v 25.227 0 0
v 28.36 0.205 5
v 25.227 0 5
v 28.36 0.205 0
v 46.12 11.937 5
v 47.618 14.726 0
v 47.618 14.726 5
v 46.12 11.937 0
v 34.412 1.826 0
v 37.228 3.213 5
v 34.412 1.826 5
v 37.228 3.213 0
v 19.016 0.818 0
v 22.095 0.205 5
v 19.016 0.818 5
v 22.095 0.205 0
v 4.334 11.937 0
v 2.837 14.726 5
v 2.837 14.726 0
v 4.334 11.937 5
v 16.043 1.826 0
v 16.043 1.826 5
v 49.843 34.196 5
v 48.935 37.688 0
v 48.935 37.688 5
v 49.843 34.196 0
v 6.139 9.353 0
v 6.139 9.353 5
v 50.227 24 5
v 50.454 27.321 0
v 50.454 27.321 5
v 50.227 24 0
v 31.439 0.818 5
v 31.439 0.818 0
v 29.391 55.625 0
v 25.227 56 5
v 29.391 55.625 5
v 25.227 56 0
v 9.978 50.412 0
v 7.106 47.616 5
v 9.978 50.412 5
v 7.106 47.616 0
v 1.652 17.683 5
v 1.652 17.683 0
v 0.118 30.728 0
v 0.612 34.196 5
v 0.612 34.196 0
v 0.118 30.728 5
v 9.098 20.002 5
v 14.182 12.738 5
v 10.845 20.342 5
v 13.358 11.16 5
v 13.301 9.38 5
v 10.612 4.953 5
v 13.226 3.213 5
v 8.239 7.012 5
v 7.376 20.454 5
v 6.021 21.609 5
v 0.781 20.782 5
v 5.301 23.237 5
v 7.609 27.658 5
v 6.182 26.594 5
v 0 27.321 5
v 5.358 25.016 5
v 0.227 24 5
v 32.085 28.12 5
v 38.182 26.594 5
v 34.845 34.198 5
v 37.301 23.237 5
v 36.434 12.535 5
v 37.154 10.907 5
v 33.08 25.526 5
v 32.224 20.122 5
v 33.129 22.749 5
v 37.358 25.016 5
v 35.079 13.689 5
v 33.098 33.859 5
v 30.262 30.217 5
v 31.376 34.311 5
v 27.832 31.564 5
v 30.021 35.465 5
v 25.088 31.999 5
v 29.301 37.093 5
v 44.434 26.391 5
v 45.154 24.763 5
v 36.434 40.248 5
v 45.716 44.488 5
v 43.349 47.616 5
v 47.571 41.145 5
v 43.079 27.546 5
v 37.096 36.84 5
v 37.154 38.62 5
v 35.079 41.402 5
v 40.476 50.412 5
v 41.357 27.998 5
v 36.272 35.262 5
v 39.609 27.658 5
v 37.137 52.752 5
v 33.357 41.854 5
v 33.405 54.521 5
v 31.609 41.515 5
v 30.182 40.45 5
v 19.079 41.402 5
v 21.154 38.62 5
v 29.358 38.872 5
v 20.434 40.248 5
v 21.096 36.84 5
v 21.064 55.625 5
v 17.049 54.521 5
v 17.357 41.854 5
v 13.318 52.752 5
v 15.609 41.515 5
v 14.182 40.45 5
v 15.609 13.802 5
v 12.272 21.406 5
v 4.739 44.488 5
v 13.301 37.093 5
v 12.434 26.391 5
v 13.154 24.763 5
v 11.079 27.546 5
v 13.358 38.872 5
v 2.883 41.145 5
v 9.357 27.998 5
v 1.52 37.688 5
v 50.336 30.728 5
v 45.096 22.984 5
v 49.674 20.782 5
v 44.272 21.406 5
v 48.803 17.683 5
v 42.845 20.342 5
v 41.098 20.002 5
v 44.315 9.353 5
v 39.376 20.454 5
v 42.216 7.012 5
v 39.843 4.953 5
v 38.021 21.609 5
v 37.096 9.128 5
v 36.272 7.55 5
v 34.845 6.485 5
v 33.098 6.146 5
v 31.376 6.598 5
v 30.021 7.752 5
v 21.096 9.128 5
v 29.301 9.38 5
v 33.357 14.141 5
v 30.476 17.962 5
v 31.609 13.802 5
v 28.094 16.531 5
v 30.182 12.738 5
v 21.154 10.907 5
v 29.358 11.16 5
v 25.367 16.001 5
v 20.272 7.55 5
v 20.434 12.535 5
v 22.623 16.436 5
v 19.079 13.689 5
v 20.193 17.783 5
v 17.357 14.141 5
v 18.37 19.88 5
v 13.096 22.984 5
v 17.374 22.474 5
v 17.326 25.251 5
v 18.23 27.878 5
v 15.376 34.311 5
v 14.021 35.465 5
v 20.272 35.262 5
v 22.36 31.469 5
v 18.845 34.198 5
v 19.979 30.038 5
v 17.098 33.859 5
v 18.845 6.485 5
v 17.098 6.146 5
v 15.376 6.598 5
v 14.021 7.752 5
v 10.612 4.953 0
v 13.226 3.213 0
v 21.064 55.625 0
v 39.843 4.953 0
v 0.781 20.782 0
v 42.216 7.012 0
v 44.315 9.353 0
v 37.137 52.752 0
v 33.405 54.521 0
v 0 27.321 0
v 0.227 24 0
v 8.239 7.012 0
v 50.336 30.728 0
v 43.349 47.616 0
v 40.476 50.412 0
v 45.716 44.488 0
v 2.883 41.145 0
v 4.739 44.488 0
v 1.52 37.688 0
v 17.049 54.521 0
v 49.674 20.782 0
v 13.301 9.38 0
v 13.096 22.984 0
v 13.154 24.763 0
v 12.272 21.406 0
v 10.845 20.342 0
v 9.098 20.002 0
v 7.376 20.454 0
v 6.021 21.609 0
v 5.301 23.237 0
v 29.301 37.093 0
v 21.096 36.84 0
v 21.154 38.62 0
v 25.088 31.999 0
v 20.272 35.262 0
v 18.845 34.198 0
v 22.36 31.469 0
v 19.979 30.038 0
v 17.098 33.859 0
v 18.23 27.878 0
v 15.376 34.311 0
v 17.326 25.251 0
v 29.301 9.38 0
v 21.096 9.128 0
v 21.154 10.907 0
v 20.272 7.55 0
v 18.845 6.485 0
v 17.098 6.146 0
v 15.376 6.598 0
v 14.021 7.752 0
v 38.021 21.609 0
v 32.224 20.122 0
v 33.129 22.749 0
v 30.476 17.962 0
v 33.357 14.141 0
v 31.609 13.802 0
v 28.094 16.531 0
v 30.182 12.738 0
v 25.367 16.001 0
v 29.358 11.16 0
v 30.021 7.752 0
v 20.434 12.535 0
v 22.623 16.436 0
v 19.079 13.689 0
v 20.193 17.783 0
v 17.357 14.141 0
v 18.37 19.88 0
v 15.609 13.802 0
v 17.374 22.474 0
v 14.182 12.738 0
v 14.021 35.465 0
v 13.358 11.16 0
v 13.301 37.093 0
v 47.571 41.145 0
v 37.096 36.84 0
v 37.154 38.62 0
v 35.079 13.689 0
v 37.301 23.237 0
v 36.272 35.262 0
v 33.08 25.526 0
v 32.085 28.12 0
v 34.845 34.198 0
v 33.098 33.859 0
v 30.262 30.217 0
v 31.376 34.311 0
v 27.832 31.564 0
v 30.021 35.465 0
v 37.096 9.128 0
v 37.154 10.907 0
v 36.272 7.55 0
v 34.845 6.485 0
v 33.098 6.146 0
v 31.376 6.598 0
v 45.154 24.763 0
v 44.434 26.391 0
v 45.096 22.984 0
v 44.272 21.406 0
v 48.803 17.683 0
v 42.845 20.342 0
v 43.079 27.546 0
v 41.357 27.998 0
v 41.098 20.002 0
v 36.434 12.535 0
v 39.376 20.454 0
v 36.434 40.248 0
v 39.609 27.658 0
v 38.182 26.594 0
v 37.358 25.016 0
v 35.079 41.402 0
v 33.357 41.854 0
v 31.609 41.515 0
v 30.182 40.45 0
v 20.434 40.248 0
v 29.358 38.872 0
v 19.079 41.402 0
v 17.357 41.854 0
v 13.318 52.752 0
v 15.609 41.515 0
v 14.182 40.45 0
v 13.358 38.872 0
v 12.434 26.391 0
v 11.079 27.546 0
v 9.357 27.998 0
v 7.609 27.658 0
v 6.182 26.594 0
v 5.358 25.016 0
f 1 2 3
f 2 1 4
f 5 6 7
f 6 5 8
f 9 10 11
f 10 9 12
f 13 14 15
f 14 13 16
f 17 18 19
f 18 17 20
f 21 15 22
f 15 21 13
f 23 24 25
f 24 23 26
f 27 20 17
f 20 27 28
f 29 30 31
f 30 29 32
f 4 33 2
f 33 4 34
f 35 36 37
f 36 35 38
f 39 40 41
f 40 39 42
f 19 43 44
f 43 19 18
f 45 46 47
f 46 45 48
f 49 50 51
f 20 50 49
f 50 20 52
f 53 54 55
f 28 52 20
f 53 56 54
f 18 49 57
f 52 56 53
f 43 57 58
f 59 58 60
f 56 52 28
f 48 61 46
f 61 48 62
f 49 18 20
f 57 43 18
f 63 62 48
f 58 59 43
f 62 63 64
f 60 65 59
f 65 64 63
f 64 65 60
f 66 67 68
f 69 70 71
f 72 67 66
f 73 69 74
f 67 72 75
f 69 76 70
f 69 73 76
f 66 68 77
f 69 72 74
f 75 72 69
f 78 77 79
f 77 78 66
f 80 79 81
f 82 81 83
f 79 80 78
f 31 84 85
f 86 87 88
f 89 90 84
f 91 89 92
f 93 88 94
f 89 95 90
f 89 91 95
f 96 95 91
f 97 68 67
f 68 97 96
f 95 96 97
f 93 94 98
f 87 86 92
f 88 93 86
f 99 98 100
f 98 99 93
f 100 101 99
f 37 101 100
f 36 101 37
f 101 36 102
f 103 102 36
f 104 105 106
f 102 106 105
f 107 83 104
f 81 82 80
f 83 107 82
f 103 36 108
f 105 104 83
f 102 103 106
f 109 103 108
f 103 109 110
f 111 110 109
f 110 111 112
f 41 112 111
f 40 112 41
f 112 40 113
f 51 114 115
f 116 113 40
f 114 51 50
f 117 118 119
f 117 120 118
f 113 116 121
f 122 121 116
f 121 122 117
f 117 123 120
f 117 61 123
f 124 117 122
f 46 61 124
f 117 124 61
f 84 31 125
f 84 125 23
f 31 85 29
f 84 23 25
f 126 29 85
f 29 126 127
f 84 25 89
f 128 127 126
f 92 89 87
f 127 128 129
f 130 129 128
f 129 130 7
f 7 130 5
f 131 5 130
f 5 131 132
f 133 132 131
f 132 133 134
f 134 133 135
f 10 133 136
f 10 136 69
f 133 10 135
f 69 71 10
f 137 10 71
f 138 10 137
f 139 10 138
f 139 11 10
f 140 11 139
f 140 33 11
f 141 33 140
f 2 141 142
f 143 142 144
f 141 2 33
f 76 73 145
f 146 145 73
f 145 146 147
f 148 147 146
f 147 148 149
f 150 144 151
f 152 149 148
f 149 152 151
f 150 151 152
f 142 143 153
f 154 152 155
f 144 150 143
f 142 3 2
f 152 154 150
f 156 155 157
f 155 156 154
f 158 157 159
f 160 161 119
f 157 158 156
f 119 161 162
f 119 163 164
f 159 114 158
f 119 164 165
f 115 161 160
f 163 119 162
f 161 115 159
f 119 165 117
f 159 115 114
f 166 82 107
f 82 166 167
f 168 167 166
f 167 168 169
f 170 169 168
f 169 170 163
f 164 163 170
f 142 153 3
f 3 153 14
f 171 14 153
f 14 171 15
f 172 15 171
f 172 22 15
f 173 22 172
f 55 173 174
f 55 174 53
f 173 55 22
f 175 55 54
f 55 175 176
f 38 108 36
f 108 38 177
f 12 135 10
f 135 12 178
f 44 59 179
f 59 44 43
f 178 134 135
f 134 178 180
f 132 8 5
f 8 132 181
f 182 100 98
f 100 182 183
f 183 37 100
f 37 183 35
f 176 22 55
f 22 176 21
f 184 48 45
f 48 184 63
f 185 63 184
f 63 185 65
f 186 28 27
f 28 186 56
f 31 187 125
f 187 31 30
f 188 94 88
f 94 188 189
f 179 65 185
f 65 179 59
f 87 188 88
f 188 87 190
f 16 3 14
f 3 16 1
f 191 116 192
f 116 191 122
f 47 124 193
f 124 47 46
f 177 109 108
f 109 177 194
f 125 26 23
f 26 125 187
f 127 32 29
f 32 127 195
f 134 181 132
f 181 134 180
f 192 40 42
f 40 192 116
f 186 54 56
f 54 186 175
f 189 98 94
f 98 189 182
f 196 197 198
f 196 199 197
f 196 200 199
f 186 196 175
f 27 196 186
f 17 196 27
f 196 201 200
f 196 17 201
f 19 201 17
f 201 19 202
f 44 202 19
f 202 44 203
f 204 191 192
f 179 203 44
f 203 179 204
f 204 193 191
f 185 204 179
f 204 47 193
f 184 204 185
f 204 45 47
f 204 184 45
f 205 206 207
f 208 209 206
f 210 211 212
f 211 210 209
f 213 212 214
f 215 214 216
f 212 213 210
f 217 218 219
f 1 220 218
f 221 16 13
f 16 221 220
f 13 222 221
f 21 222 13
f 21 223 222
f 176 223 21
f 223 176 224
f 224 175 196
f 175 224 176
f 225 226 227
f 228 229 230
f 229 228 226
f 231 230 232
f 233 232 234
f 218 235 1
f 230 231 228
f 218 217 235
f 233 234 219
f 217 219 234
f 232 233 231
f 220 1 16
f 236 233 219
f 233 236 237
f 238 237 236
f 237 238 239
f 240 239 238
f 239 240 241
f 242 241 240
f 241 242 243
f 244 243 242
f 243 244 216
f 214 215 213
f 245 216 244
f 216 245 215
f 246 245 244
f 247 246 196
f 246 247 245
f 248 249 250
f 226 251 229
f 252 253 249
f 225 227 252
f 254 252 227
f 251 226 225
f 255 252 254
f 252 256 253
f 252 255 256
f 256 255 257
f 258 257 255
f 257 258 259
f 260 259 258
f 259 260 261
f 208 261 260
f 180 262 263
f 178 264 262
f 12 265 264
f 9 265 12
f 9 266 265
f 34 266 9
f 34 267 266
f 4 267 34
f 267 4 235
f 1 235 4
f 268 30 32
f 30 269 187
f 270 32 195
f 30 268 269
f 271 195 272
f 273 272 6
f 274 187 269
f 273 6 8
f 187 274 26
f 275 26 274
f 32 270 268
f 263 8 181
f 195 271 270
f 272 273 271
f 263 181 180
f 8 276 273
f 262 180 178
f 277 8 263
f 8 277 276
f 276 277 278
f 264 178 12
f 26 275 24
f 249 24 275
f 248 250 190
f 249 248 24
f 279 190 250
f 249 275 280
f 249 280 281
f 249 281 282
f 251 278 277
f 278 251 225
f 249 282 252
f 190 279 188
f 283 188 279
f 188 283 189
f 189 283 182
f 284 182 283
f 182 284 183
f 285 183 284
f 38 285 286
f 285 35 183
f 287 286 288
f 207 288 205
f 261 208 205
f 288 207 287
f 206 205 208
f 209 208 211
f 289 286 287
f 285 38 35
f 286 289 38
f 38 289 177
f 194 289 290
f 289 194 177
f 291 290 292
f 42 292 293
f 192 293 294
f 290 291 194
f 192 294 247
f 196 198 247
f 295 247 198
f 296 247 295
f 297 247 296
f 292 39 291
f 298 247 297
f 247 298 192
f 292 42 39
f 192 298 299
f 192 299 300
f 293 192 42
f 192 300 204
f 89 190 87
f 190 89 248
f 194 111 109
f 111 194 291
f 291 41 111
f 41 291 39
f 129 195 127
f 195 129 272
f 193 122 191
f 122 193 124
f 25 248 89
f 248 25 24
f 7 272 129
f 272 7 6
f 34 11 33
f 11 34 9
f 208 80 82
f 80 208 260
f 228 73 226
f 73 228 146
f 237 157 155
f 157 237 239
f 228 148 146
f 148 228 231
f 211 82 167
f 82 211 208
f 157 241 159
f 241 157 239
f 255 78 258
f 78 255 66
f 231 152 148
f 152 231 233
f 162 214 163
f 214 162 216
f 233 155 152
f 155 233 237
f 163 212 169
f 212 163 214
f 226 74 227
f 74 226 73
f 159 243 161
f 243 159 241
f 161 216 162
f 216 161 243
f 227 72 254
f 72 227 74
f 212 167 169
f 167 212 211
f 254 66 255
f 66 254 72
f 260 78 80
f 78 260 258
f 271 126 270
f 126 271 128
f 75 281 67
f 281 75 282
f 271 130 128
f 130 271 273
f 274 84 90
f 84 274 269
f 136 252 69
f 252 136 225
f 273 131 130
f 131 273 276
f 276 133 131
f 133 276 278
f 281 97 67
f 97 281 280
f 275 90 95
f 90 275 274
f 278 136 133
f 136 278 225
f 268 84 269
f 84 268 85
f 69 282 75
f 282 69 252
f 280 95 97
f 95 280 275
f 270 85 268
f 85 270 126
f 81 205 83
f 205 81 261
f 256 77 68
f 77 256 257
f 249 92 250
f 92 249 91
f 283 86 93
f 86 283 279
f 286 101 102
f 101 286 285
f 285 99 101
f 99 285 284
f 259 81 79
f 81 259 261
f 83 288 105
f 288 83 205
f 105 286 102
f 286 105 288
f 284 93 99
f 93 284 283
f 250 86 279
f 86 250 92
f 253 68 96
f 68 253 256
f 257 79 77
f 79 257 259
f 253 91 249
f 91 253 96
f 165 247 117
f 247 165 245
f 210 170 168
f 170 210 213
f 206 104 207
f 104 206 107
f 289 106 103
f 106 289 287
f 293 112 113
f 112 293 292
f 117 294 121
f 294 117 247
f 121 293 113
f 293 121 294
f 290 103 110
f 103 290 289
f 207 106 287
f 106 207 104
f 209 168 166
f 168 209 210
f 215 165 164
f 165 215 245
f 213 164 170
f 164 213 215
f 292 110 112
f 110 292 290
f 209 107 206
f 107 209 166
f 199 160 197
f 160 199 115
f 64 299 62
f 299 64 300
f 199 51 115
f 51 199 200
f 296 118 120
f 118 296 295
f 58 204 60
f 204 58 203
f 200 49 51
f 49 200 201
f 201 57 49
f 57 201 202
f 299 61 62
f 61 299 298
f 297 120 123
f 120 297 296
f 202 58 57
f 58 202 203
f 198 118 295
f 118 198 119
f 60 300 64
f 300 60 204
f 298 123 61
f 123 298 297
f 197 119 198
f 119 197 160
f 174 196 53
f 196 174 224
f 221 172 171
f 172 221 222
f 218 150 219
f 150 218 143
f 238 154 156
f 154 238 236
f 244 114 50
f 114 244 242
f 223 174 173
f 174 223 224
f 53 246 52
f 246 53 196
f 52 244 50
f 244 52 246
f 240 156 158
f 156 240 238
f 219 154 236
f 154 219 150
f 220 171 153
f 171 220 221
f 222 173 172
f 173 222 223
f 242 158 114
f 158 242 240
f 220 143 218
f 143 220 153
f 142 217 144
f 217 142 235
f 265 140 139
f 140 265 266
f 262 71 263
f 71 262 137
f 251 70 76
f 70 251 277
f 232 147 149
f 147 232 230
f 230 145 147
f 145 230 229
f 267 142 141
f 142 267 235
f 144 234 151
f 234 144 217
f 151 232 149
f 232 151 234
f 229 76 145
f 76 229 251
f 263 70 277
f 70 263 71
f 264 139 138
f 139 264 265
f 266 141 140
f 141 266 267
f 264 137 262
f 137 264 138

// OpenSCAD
$fn = 32;

// ----------------------------------------------------------------------
// Cam plate: single_lobe cam, base R24
// ----------------------------------------------------------------------

// --- parameters (mm) ---
base_r = 24;              // base circle radius
lobe_h = 8;               // cam lobe rise
bore_r = 8;               // shaft bore radius
plate_t = 5;              // plate thickness, Z (extrusion height)
ring_r = 16;              // lightening ring radius
bolt_r = 4;               // lightening hole radius

profile = [[50.227, 24], [50.454, 27.321], [50.336, 30.728], [49.843, 34.196], [48.935, 37.688], [47.571, 41.145], [45.716, 44.488], [43.349, 47.616], [40.476, 50.412], [37.137, 52.752], [33.405, 54.521], [29.391, 55.625], [25.227, 56], [21.064, 55.625], [17.049, 54.521], [13.318, 52.752], [9.978, 50.412], [7.106, 47.616], [4.739, 44.488], [2.883, 41.145], [1.52, 37.688], [0.612, 34.196], [0.118, 30.728], [0, 27.321], [0.227, 24], [0.781, 20.782], [1.652, 17.683], [2.837, 14.726], [4.334, 11.937], [6.139, 9.353], [8.239, 7.012], [10.612, 4.953], [13.226, 3.213], [16.043, 1.826], [19.016, 0.818], [22.095, 0.205], [25.227, 0], [28.36, 0.205], [31.439, 0.818], [34.412, 1.826], [37.228, 3.213], [39.843, 4.953], [42.216, 7.012], [44.315, 9.353], [46.12, 11.937], [47.618, 14.726], [48.803, 17.683], [49.674, 20.782]];  // primary outline, 48 points, counter clockwise
void_1 = [[33.08, 25.526], [32.085, 28.12], [30.262, 30.217], [27.832, 31.564], [25.088, 31.999], [22.36, 31.469], [19.979, 30.038], [18.23, 27.878], [17.326, 25.251], [17.374, 22.474], [18.37, 19.88], [20.193, 17.783], [22.623, 16.436], [25.367, 16.001], [28.094, 16.531], [30.476, 17.962], [32.224, 20.122], [33.129, 22.749]];  // shaft bore, 18 points
void_2 = [[45.154, 24.763], [44.434, 26.391], [43.079, 27.546], [41.357, 27.998], [39.609, 27.658], [38.182, 26.594], [37.358, 25.016], [37.301, 23.237], [38.021, 21.609], [39.376, 20.454], [41.098, 20.002], [42.845, 20.342], [44.272, 21.406], [45.096, 22.984]];  // lightening hole 1, 14 points
void_3 = [[37.154, 38.62], [36.434, 40.248], [35.079, 41.402], [33.357, 41.854], [31.609, 41.515], [30.182, 40.45], [29.358, 38.872], [29.301, 37.093], [30.021, 35.465], [31.376, 34.311], [33.098, 33.859], [34.845, 34.198], [36.272, 35.262], [37.096, 36.84]];  // lightening hole 2, 14 points
void_4 = [[21.154, 38.62], [20.434, 40.248], [19.079, 41.402], [17.357, 41.854], [15.609, 41.515], [14.182, 40.45], [13.358, 38.872], [13.301, 37.093], [14.021, 35.465], [15.376, 34.311], [17.098, 33.859], [18.845, 34.198], [20.272, 35.262], [21.096, 36.84]];  // lightening hole 3, 14 points
void_5 = [[13.154, 24.763], [12.434, 26.391], [11.079, 27.546], [9.357, 27.998], [7.609, 27.658], [6.182, 26.594], [5.358, 25.016], [5.301, 23.237], [6.021, 21.609], [7.376, 20.454], [9.098, 20.002], [10.845, 20.342], [12.272, 21.406], [13.096, 22.984]];  // lightening hole 4, 14 points
void_6 = [[21.154, 10.907], [20.434, 12.535], [19.079, 13.689], [17.357, 14.141], [15.609, 13.802], [14.182, 12.738], [13.358, 11.16], [13.301, 9.38], [14.021, 7.752], [15.376, 6.598], [17.098, 6.146], [18.845, 6.485], [20.272, 7.55], [21.096, 9.128]];  // lightening hole 5, 14 points
void_7 = [[37.154, 10.907], [36.434, 12.535], [35.079, 13.689], [33.357, 14.141], [31.609, 13.802], [30.182, 12.738], [29.358, 11.16], [29.301, 9.38], [30.021, 7.752], [31.376, 6.598], [33.098, 6.146], [34.845, 6.485], [36.272, 7.55], [37.096, 9.128]];  // lightening hole 6, 14 points

// --- the one profile operation ---
difference() {
  linear_extrude(height = plate_t) polygon(points = profile);
  translate([0, 0, -1])
    linear_extrude(height = plate_t + 2) polygon(points = void_1);
  translate([0, 0, -1])
    linear_extrude(height = plate_t + 2) polygon(points = void_2);
  translate([0, 0, -1])
    linear_extrude(height = plate_t + 2) polygon(points = void_3);
  translate([0, 0, -1])
    linear_extrude(height = plate_t + 2) polygon(points = void_4);
  translate([0, 0, -1])
    linear_extrude(height = plate_t + 2) polygon(points = void_5);
  translate([0, 0, -1])
    linear_extrude(height = plate_t + 2) polygon(points = void_6);
  translate([0, 0, -1])
    linear_extrude(height = plate_t + 2) polygon(points = void_7);
}
